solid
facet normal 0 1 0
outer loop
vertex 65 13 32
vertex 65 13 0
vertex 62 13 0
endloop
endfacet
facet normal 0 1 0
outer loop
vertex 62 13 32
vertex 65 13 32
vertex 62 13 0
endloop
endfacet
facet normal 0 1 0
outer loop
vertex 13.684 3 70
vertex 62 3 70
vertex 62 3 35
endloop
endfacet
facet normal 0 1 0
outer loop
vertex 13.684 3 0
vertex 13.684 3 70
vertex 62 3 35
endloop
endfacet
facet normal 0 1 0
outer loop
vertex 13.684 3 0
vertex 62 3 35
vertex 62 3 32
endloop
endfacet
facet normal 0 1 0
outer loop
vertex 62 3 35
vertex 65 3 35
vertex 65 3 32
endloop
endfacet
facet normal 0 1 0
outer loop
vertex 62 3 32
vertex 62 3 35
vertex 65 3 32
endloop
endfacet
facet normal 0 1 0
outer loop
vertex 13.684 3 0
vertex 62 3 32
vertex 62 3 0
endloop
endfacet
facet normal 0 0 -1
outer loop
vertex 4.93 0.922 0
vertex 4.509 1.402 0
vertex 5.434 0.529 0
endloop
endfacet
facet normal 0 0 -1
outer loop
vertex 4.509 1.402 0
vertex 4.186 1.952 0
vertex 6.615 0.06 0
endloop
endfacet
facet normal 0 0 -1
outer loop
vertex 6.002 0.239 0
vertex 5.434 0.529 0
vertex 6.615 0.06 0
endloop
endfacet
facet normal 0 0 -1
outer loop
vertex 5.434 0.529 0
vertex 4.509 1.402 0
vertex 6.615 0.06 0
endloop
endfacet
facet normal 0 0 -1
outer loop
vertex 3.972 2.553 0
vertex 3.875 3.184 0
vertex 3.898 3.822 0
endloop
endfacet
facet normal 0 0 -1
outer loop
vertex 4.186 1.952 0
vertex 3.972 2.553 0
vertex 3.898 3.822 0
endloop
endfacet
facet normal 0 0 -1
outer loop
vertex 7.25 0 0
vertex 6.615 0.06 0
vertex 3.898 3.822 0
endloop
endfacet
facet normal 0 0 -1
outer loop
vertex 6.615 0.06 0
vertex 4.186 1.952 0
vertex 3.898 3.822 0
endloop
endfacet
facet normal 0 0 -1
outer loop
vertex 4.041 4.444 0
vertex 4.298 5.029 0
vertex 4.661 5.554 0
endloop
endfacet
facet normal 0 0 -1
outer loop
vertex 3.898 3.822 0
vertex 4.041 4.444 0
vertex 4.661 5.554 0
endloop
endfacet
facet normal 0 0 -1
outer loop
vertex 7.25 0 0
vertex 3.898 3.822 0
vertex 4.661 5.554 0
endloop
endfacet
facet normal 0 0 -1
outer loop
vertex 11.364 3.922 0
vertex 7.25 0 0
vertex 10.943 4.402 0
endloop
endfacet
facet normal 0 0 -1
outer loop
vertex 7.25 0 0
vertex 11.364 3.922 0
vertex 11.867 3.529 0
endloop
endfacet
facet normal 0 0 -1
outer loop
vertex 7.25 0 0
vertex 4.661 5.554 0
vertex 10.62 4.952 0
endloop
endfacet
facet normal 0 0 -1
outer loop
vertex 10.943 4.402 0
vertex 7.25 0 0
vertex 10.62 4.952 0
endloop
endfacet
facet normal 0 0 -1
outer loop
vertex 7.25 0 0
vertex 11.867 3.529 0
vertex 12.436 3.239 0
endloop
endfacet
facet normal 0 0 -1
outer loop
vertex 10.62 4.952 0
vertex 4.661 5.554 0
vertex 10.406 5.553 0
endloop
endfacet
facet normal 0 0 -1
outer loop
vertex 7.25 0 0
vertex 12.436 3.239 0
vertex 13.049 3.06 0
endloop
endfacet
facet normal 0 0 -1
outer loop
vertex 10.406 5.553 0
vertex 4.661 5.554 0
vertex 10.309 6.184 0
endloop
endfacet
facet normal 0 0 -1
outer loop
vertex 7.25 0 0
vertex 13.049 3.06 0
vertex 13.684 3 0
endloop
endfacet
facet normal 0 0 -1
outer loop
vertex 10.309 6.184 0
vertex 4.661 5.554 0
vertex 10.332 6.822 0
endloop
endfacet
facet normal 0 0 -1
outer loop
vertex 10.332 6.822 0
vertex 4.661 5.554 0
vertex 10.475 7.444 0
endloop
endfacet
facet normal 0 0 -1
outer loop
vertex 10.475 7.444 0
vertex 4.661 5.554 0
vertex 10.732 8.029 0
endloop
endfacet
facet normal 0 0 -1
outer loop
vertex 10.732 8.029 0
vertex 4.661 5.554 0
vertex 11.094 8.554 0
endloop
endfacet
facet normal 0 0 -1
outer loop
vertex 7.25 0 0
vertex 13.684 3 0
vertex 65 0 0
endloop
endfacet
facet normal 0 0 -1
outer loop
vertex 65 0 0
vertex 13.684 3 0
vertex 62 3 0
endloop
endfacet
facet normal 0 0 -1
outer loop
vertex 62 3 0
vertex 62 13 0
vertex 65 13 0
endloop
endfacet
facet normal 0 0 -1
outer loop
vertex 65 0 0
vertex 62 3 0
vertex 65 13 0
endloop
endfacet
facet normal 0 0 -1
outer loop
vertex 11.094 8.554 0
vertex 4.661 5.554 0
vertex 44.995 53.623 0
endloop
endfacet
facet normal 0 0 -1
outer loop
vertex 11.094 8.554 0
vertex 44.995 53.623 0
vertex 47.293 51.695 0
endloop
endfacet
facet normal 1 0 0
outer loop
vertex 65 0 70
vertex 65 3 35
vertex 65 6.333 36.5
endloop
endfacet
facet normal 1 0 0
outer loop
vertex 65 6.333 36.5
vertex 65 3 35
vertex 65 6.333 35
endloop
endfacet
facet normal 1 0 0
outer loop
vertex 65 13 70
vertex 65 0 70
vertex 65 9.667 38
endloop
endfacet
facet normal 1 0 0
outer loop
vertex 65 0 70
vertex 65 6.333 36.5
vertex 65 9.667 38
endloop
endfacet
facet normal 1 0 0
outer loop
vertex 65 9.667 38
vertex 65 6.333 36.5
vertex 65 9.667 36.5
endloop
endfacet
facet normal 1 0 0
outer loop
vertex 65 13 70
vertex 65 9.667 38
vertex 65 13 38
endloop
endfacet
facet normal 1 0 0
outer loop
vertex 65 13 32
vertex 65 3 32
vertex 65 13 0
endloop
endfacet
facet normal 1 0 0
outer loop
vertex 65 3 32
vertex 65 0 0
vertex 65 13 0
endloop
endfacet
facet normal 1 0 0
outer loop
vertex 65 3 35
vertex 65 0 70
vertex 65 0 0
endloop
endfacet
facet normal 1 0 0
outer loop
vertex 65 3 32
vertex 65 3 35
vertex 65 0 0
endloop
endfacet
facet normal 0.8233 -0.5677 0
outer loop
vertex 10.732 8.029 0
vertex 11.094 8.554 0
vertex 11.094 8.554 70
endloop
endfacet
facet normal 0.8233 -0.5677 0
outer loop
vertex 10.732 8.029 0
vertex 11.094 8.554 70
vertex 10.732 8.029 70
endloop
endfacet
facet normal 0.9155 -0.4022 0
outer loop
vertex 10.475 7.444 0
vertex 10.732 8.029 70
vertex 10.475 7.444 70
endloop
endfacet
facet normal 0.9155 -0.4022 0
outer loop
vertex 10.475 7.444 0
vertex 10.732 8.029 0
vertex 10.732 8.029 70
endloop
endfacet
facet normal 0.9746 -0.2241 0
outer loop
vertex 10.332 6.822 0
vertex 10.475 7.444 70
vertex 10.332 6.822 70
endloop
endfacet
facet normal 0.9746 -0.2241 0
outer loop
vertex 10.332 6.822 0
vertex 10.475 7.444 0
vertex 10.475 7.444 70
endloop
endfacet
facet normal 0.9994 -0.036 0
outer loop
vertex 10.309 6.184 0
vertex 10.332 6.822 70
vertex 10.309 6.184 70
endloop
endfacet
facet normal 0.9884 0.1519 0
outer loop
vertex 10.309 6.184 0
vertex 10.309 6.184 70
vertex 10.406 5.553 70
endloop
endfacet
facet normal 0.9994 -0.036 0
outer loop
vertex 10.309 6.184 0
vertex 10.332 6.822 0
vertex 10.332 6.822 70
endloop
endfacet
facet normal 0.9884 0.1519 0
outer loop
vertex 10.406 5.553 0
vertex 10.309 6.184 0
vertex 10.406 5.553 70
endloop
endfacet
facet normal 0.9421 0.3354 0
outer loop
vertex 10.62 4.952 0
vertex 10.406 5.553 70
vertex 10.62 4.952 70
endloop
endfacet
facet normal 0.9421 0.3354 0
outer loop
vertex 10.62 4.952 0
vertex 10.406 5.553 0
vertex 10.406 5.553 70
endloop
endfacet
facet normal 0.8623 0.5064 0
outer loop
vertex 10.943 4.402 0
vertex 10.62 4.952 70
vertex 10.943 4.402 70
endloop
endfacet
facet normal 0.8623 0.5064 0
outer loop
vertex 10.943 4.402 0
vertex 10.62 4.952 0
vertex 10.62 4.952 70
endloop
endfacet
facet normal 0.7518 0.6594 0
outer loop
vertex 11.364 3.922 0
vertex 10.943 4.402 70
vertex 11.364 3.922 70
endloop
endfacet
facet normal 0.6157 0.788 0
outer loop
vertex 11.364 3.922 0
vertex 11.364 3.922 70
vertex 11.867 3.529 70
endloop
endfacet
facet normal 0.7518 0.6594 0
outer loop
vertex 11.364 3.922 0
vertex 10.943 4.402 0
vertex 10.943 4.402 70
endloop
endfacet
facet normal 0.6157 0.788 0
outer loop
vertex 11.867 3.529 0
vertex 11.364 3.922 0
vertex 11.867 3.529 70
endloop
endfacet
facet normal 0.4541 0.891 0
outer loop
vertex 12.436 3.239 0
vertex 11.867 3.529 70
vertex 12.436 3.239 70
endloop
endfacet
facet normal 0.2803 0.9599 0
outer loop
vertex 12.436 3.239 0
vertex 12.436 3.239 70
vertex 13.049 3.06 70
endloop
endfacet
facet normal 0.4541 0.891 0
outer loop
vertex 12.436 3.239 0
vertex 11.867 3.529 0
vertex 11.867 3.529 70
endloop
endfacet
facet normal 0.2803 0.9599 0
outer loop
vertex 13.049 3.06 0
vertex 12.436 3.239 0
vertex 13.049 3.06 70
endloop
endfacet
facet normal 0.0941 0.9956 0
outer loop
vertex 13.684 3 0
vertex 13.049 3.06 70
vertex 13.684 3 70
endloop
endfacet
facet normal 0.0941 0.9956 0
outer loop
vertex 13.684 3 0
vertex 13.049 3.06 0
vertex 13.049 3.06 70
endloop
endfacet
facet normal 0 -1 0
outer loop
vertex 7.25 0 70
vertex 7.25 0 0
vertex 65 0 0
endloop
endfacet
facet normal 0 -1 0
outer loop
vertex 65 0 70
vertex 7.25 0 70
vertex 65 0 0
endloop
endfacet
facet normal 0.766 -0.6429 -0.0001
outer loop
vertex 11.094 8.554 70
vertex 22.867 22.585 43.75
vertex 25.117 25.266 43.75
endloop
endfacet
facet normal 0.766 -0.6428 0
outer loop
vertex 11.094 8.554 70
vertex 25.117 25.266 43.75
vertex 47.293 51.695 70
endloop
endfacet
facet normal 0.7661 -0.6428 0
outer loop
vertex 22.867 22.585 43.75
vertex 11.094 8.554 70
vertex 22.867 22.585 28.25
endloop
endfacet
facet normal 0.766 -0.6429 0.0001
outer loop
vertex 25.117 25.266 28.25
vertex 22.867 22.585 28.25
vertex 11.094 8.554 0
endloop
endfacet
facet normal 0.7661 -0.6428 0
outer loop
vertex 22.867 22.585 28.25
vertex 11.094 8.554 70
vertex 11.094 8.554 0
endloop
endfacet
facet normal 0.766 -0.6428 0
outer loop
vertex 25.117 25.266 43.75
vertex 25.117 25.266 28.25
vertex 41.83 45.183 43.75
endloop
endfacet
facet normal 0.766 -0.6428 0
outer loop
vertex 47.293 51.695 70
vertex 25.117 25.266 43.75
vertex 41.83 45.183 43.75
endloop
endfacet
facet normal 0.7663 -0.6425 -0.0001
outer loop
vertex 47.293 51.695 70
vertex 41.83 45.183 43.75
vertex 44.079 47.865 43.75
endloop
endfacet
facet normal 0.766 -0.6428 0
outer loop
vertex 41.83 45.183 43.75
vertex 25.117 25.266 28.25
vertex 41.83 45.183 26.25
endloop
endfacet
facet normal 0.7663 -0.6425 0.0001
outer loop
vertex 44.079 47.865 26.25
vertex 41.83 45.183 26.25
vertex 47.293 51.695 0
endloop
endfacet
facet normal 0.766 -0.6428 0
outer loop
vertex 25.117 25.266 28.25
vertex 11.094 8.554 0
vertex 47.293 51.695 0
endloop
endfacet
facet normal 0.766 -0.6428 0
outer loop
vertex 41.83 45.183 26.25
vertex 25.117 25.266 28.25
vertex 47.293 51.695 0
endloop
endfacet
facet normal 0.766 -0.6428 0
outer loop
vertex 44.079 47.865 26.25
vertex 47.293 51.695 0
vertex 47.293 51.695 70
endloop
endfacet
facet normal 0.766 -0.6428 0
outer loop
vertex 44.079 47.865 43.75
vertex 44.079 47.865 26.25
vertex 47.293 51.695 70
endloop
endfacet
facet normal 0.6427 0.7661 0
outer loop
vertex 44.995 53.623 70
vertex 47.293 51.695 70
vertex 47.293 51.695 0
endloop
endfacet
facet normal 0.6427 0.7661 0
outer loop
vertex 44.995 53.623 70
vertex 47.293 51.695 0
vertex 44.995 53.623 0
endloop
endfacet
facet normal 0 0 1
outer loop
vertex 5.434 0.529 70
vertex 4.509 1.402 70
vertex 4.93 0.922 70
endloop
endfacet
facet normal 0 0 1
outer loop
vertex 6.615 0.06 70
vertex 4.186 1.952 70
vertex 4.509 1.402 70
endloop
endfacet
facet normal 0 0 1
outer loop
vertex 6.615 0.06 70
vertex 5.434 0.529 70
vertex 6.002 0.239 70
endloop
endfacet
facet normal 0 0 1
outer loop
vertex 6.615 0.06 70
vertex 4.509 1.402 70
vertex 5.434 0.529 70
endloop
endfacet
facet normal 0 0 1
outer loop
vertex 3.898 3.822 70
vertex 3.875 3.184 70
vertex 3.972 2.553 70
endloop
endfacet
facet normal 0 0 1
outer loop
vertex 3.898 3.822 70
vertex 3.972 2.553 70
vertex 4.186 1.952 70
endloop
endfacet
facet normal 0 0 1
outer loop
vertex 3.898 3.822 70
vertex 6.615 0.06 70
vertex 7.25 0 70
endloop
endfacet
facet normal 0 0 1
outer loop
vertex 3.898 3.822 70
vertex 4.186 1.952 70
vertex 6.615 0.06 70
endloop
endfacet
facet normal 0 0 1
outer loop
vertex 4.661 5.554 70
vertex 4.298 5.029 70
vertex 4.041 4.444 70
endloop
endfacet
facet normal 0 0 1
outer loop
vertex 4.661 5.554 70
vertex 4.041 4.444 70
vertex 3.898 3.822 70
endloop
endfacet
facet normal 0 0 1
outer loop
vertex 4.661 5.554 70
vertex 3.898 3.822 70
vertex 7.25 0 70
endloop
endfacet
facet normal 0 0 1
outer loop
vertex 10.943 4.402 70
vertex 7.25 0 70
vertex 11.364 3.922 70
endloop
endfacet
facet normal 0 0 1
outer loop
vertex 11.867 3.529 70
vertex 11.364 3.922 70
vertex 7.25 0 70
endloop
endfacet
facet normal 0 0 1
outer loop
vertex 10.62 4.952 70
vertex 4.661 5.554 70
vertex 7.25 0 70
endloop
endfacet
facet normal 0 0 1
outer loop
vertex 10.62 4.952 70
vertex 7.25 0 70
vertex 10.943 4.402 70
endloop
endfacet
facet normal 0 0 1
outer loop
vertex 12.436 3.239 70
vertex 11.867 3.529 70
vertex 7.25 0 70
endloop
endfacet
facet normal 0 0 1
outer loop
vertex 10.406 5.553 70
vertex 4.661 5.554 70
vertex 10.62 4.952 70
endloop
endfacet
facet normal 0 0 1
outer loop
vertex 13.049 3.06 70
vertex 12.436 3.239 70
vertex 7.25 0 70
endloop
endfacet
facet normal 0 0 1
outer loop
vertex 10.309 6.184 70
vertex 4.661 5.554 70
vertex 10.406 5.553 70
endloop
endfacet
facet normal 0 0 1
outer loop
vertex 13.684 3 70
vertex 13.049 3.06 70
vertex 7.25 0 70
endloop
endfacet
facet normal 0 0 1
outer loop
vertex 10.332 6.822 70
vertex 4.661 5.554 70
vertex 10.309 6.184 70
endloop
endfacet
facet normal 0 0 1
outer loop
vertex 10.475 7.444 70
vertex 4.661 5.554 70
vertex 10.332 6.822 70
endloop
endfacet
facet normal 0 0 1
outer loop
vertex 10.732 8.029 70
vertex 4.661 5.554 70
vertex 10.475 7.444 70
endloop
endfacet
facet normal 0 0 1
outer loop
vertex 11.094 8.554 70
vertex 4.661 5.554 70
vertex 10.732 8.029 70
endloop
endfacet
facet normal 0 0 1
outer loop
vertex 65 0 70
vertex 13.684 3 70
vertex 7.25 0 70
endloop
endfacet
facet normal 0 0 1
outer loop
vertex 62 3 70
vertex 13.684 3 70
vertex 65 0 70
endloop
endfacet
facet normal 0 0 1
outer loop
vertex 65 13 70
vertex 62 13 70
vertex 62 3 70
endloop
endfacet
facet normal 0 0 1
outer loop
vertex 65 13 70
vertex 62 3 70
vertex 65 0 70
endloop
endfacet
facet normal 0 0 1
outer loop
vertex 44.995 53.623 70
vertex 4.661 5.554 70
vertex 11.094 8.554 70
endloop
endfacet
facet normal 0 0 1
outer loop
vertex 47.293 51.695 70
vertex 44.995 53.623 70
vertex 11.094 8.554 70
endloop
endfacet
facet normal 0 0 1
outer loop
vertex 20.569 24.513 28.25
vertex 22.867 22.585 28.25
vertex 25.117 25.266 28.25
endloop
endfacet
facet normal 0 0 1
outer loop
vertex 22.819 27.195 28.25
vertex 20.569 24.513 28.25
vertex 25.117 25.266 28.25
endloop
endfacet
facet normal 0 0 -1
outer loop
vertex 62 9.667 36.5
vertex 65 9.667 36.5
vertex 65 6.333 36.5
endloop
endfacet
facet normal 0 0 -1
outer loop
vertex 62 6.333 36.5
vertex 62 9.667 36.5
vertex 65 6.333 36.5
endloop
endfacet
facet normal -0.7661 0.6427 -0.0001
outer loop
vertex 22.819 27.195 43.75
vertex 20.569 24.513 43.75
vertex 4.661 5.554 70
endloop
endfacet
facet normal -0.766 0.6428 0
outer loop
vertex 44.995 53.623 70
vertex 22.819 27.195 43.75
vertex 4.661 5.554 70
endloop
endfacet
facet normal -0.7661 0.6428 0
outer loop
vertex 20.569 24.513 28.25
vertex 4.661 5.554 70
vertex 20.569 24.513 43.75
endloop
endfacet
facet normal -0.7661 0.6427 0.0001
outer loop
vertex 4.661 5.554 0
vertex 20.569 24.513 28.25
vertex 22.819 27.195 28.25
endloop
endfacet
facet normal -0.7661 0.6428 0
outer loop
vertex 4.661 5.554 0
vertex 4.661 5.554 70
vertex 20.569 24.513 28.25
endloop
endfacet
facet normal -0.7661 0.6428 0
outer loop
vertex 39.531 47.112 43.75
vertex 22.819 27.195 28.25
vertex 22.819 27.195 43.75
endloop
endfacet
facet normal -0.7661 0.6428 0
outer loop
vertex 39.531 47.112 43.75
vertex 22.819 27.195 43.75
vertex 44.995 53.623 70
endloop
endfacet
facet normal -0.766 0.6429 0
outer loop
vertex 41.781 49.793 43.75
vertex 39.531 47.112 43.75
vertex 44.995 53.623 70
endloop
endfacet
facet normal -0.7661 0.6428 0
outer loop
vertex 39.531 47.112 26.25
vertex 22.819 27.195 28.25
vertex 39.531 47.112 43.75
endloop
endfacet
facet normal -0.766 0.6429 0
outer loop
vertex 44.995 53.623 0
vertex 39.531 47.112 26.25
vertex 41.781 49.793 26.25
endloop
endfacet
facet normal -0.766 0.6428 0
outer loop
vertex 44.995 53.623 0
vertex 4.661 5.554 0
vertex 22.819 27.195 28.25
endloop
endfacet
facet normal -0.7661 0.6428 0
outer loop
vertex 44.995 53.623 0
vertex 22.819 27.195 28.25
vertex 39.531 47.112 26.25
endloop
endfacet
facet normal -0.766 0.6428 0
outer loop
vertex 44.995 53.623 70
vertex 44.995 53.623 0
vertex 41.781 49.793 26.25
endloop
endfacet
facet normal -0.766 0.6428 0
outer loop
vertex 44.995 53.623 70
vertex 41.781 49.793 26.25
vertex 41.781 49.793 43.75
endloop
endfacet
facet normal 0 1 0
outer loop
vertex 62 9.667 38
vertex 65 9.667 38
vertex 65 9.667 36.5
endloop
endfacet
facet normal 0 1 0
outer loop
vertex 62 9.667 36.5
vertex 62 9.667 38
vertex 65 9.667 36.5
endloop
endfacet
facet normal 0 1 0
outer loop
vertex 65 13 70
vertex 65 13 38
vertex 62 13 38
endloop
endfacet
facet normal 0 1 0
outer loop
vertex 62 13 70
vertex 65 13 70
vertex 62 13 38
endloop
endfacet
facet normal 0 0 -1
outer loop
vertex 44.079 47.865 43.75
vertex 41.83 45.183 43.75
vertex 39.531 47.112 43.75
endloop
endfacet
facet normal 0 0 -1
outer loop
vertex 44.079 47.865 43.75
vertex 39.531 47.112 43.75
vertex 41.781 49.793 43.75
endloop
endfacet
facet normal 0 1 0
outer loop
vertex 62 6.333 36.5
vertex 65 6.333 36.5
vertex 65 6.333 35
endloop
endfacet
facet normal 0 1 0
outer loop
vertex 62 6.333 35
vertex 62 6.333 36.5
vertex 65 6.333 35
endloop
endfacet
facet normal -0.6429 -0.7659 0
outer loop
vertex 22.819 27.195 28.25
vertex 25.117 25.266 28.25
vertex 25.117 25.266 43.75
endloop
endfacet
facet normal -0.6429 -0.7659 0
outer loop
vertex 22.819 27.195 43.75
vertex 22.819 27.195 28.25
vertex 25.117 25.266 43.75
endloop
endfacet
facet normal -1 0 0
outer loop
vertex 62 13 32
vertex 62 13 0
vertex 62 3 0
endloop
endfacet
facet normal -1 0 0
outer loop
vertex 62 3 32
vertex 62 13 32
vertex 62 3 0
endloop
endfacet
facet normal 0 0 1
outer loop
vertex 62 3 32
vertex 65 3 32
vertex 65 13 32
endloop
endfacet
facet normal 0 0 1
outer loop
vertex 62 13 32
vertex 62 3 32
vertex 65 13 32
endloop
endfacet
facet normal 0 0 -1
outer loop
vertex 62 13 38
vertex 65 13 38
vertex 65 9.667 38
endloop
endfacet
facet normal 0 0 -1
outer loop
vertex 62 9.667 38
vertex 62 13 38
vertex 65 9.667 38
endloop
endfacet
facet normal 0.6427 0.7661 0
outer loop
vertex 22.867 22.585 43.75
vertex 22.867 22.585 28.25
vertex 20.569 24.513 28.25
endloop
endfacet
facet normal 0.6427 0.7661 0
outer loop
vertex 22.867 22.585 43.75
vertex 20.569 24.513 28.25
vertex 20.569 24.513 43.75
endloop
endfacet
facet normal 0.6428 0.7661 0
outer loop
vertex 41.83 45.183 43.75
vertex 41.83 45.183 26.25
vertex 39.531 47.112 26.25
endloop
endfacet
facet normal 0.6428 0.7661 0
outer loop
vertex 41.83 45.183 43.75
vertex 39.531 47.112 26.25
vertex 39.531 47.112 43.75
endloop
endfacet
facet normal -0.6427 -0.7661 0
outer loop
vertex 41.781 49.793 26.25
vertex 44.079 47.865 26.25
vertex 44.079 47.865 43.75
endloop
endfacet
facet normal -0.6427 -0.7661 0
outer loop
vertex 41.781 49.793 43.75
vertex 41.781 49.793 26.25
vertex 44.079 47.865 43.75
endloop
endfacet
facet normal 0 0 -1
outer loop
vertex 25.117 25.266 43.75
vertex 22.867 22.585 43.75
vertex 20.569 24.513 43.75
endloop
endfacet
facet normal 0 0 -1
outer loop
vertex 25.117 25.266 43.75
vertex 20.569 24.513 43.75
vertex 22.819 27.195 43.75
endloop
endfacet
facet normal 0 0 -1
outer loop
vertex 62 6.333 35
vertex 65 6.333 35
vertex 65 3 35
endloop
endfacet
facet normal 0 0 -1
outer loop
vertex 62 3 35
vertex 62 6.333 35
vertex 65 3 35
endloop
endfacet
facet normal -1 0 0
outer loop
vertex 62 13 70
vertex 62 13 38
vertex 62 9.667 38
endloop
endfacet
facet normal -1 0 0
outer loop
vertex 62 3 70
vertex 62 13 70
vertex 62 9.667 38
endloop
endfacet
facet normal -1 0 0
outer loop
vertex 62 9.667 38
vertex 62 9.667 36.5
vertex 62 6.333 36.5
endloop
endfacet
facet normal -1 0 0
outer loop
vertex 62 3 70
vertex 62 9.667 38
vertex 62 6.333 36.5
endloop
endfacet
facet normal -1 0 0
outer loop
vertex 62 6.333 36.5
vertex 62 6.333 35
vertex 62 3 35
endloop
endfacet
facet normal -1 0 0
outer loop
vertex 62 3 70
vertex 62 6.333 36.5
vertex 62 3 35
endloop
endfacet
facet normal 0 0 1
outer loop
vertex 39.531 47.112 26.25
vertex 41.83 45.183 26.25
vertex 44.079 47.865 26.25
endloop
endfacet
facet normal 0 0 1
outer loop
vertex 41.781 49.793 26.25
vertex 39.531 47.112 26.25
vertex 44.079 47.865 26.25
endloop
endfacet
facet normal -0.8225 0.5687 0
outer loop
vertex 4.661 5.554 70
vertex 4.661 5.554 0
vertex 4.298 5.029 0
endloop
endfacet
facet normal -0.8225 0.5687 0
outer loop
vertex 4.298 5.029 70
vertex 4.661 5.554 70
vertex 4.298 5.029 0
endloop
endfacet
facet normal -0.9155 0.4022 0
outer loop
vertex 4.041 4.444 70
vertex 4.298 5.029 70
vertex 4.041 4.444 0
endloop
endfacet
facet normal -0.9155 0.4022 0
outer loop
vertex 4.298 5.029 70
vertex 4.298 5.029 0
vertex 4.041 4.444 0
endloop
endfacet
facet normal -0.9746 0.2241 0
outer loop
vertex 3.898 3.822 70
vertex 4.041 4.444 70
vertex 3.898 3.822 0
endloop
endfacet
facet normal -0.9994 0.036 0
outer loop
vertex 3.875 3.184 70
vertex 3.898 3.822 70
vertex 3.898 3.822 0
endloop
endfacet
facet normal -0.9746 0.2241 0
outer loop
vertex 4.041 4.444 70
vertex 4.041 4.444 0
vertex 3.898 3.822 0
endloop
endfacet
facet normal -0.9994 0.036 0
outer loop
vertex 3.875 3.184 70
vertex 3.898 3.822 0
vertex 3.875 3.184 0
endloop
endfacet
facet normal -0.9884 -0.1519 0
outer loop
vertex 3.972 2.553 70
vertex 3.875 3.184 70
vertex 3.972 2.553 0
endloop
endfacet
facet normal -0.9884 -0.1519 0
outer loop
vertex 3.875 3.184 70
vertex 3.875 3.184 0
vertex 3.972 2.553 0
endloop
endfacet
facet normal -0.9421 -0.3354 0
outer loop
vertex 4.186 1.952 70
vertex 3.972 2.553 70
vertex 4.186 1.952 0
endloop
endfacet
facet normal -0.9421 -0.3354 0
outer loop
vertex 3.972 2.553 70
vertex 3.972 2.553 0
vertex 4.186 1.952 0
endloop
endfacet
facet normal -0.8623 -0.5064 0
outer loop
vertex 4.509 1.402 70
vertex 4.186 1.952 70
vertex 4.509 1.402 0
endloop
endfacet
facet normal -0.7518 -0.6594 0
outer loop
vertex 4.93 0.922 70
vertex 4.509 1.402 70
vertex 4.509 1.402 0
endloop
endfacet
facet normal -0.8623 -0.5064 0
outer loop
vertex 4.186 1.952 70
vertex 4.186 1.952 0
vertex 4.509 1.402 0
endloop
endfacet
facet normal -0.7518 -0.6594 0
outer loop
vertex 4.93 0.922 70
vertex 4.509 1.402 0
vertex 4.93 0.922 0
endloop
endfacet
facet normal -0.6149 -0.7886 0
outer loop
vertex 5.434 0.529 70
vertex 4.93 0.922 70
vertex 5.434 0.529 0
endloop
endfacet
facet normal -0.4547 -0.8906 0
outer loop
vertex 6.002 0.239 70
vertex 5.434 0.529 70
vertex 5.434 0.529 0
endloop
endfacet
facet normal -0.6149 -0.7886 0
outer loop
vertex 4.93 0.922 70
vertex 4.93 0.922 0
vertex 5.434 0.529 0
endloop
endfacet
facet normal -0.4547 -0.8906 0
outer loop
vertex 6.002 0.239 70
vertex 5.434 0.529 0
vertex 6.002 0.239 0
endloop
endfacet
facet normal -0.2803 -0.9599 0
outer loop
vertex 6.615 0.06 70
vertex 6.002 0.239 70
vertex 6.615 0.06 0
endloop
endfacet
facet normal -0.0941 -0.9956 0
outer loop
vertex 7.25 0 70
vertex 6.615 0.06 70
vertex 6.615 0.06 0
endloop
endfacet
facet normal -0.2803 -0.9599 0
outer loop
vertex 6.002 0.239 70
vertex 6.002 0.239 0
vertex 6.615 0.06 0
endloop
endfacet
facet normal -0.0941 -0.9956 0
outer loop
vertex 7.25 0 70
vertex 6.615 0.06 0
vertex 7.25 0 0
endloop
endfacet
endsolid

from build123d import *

# Parameters (mm, degrees)
PAD_DEPTH       = 70
SKETCH001_W     = 3.5
SKETCH001_H     = 17.5
SKETCH001_H_2   = 15.5
POCKET_DEPTH    = 34.50505
POCKET001_DEPTH = 5


with BuildPart() as part:
    # Sketch → Pad (new body)
    with BuildSketch(Plane.XY):
        with BuildLine():
            Line((7.250462, 0), (65, 0))
            Line((65, 0), (65, 3))
            Line((65, 3), (65, 13))
            Line((65, 13), (62, 13))
            Line((62, 13), (62, 3))
            Line((62, 3), (13.683983, 3))
            ThreePointArc((11.094028, 8.554176), (10.619805, 4.952097), (13.683983, 3))
            Line((11.094028, 8.554176), (47.293266, 51.694748))
            Line((47.293266, 51.694748), (44.995133, 53.623111))
            Line((4.660507, 5.554176), (44.995133, 53.623111))
            ThreePointArc((4.660507, 5.554176), (4.186285, 1.952097), (7.250462, 0))
        make_face()
    extrude(amount=PAD_DEPTH)

    # Sketch001 (on Face9 of Pad) → Pocket (cut, through all)
    with BuildSketch(Plane(origin=(2.298133, -1.928363, 0), x_dir=(0.642788, 0.766044, 0), z_dir=(0.766044, -0.642788, 0))):
        with Locations((63.25, 35)):
            Rectangle(SKETCH001_W, SKETCH001_H)
        with Locations((33.75, 36)):
            Rectangle(SKETCH001_W, SKETCH001_H_2)
    extrude(amount=-POCKET_DEPTH, mode=Mode.SUBTRACT)

    # Sketch002 (on Face16 of Pocket) → Pocket001 (cut)
    with BuildSketch(Plane.YZ.offset(65)):
        Polygon((3, 35), (3, 32), (13, 32), (13, 38), (9.666667, 38), (9.666667, 36.5), (6.333333, 36.5), (6.333333, 35), align=None)
    extrude(amount=-POCKET001_DEPTH, mode=Mode.SUBTRACT)


solid = part.part
